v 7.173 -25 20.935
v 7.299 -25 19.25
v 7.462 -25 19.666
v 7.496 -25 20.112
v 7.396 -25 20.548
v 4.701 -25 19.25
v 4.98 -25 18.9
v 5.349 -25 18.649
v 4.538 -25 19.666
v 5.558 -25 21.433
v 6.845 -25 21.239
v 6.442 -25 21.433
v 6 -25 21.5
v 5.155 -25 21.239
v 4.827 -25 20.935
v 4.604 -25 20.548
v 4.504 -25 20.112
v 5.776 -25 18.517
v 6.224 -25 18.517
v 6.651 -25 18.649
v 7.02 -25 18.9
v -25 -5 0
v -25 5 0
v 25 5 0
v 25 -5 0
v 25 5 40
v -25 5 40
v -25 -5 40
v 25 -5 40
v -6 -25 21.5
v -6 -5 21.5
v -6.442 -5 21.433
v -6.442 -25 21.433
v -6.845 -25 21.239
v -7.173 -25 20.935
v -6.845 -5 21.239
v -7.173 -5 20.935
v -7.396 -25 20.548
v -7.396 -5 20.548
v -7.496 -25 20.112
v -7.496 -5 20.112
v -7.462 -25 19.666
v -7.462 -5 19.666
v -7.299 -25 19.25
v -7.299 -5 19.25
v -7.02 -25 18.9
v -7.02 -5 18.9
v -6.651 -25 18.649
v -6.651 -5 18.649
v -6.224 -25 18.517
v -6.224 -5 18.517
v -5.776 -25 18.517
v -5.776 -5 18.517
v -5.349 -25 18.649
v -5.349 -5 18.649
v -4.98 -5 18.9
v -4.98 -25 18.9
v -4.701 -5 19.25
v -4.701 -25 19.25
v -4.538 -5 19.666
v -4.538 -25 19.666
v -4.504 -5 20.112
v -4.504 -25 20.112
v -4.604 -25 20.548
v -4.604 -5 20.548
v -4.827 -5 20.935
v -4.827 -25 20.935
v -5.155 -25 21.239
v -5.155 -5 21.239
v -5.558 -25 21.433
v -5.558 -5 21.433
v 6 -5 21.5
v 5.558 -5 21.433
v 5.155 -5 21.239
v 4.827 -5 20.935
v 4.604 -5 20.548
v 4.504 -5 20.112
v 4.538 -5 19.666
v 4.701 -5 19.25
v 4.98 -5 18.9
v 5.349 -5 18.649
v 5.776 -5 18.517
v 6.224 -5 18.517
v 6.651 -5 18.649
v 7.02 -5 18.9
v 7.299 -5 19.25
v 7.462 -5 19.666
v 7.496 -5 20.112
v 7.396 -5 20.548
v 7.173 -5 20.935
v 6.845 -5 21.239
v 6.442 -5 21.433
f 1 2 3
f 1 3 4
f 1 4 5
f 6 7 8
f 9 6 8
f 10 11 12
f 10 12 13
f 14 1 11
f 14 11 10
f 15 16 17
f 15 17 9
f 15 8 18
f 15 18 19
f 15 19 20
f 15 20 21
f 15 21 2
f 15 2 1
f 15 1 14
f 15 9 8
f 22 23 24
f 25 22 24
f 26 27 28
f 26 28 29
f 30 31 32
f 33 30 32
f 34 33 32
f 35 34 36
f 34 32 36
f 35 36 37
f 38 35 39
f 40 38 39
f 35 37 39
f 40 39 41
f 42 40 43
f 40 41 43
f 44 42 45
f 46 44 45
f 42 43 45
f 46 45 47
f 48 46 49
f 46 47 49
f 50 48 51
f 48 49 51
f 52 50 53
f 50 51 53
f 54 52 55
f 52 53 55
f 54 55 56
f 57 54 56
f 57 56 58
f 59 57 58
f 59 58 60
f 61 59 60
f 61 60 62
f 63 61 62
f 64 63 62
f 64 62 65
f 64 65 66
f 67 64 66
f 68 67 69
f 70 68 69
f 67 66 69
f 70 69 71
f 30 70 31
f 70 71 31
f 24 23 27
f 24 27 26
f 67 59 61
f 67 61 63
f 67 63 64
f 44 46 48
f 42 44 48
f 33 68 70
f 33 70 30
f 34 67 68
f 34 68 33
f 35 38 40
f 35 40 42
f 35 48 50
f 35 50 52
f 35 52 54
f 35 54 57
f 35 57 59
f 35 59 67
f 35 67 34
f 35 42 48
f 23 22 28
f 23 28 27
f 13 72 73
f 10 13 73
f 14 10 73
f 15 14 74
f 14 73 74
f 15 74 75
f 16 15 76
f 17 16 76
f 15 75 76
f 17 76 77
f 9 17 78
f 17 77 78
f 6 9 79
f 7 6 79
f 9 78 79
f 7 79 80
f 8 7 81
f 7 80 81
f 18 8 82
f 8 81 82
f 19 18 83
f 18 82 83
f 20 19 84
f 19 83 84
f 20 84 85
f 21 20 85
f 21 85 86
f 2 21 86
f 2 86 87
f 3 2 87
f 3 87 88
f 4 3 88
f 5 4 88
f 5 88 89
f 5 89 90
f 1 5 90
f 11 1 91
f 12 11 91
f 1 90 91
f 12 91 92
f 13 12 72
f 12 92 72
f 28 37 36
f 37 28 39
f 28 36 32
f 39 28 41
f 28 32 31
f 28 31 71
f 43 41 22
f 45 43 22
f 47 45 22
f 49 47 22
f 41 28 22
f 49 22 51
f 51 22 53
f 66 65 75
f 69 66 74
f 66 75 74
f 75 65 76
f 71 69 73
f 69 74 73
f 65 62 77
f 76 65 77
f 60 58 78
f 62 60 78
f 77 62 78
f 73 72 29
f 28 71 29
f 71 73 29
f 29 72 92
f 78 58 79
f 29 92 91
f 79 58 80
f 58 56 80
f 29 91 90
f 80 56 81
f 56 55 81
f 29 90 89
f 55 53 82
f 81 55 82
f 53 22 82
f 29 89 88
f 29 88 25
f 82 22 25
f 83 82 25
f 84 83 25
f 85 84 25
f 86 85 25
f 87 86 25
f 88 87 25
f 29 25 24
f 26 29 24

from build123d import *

# Parameters (mm, degrees)
SZKIC1_W                    = 50
SZKIC1_H                    = 10
DODANIE_WYCI_GNI_CIE1_DEPTH = 40
SZKIC2_R                    = 1.5
DODANIE_WYCI_GNI_CIE2_DEPTH = 20


with BuildPart() as part:
    # Szkic1 → Dodanie-wyciągnięcie1 (new body)
    with BuildSketch(Plane.XY):
        Rectangle(SZKIC1_W, SZKIC1_H)
    extrude(amount=DODANIE_WYCI_GNI_CIE1_DEPTH)

    # Szkic2 → Dodanie-wyciągnięcie2 (add)
    with BuildSketch(Plane.XZ.offset(5)):
        with Locations(Location((-6, 20, 0), (0, 0, 90))):
            Circle(SZKIC2_R)
        with Locations(Location((6, 20, 0), (0, 0, 90))):
            Circle(SZKIC2_R)
    extrude(amount=DODANIE_WYCI_GNI_CIE2_DEPTH)


solid = part.part
